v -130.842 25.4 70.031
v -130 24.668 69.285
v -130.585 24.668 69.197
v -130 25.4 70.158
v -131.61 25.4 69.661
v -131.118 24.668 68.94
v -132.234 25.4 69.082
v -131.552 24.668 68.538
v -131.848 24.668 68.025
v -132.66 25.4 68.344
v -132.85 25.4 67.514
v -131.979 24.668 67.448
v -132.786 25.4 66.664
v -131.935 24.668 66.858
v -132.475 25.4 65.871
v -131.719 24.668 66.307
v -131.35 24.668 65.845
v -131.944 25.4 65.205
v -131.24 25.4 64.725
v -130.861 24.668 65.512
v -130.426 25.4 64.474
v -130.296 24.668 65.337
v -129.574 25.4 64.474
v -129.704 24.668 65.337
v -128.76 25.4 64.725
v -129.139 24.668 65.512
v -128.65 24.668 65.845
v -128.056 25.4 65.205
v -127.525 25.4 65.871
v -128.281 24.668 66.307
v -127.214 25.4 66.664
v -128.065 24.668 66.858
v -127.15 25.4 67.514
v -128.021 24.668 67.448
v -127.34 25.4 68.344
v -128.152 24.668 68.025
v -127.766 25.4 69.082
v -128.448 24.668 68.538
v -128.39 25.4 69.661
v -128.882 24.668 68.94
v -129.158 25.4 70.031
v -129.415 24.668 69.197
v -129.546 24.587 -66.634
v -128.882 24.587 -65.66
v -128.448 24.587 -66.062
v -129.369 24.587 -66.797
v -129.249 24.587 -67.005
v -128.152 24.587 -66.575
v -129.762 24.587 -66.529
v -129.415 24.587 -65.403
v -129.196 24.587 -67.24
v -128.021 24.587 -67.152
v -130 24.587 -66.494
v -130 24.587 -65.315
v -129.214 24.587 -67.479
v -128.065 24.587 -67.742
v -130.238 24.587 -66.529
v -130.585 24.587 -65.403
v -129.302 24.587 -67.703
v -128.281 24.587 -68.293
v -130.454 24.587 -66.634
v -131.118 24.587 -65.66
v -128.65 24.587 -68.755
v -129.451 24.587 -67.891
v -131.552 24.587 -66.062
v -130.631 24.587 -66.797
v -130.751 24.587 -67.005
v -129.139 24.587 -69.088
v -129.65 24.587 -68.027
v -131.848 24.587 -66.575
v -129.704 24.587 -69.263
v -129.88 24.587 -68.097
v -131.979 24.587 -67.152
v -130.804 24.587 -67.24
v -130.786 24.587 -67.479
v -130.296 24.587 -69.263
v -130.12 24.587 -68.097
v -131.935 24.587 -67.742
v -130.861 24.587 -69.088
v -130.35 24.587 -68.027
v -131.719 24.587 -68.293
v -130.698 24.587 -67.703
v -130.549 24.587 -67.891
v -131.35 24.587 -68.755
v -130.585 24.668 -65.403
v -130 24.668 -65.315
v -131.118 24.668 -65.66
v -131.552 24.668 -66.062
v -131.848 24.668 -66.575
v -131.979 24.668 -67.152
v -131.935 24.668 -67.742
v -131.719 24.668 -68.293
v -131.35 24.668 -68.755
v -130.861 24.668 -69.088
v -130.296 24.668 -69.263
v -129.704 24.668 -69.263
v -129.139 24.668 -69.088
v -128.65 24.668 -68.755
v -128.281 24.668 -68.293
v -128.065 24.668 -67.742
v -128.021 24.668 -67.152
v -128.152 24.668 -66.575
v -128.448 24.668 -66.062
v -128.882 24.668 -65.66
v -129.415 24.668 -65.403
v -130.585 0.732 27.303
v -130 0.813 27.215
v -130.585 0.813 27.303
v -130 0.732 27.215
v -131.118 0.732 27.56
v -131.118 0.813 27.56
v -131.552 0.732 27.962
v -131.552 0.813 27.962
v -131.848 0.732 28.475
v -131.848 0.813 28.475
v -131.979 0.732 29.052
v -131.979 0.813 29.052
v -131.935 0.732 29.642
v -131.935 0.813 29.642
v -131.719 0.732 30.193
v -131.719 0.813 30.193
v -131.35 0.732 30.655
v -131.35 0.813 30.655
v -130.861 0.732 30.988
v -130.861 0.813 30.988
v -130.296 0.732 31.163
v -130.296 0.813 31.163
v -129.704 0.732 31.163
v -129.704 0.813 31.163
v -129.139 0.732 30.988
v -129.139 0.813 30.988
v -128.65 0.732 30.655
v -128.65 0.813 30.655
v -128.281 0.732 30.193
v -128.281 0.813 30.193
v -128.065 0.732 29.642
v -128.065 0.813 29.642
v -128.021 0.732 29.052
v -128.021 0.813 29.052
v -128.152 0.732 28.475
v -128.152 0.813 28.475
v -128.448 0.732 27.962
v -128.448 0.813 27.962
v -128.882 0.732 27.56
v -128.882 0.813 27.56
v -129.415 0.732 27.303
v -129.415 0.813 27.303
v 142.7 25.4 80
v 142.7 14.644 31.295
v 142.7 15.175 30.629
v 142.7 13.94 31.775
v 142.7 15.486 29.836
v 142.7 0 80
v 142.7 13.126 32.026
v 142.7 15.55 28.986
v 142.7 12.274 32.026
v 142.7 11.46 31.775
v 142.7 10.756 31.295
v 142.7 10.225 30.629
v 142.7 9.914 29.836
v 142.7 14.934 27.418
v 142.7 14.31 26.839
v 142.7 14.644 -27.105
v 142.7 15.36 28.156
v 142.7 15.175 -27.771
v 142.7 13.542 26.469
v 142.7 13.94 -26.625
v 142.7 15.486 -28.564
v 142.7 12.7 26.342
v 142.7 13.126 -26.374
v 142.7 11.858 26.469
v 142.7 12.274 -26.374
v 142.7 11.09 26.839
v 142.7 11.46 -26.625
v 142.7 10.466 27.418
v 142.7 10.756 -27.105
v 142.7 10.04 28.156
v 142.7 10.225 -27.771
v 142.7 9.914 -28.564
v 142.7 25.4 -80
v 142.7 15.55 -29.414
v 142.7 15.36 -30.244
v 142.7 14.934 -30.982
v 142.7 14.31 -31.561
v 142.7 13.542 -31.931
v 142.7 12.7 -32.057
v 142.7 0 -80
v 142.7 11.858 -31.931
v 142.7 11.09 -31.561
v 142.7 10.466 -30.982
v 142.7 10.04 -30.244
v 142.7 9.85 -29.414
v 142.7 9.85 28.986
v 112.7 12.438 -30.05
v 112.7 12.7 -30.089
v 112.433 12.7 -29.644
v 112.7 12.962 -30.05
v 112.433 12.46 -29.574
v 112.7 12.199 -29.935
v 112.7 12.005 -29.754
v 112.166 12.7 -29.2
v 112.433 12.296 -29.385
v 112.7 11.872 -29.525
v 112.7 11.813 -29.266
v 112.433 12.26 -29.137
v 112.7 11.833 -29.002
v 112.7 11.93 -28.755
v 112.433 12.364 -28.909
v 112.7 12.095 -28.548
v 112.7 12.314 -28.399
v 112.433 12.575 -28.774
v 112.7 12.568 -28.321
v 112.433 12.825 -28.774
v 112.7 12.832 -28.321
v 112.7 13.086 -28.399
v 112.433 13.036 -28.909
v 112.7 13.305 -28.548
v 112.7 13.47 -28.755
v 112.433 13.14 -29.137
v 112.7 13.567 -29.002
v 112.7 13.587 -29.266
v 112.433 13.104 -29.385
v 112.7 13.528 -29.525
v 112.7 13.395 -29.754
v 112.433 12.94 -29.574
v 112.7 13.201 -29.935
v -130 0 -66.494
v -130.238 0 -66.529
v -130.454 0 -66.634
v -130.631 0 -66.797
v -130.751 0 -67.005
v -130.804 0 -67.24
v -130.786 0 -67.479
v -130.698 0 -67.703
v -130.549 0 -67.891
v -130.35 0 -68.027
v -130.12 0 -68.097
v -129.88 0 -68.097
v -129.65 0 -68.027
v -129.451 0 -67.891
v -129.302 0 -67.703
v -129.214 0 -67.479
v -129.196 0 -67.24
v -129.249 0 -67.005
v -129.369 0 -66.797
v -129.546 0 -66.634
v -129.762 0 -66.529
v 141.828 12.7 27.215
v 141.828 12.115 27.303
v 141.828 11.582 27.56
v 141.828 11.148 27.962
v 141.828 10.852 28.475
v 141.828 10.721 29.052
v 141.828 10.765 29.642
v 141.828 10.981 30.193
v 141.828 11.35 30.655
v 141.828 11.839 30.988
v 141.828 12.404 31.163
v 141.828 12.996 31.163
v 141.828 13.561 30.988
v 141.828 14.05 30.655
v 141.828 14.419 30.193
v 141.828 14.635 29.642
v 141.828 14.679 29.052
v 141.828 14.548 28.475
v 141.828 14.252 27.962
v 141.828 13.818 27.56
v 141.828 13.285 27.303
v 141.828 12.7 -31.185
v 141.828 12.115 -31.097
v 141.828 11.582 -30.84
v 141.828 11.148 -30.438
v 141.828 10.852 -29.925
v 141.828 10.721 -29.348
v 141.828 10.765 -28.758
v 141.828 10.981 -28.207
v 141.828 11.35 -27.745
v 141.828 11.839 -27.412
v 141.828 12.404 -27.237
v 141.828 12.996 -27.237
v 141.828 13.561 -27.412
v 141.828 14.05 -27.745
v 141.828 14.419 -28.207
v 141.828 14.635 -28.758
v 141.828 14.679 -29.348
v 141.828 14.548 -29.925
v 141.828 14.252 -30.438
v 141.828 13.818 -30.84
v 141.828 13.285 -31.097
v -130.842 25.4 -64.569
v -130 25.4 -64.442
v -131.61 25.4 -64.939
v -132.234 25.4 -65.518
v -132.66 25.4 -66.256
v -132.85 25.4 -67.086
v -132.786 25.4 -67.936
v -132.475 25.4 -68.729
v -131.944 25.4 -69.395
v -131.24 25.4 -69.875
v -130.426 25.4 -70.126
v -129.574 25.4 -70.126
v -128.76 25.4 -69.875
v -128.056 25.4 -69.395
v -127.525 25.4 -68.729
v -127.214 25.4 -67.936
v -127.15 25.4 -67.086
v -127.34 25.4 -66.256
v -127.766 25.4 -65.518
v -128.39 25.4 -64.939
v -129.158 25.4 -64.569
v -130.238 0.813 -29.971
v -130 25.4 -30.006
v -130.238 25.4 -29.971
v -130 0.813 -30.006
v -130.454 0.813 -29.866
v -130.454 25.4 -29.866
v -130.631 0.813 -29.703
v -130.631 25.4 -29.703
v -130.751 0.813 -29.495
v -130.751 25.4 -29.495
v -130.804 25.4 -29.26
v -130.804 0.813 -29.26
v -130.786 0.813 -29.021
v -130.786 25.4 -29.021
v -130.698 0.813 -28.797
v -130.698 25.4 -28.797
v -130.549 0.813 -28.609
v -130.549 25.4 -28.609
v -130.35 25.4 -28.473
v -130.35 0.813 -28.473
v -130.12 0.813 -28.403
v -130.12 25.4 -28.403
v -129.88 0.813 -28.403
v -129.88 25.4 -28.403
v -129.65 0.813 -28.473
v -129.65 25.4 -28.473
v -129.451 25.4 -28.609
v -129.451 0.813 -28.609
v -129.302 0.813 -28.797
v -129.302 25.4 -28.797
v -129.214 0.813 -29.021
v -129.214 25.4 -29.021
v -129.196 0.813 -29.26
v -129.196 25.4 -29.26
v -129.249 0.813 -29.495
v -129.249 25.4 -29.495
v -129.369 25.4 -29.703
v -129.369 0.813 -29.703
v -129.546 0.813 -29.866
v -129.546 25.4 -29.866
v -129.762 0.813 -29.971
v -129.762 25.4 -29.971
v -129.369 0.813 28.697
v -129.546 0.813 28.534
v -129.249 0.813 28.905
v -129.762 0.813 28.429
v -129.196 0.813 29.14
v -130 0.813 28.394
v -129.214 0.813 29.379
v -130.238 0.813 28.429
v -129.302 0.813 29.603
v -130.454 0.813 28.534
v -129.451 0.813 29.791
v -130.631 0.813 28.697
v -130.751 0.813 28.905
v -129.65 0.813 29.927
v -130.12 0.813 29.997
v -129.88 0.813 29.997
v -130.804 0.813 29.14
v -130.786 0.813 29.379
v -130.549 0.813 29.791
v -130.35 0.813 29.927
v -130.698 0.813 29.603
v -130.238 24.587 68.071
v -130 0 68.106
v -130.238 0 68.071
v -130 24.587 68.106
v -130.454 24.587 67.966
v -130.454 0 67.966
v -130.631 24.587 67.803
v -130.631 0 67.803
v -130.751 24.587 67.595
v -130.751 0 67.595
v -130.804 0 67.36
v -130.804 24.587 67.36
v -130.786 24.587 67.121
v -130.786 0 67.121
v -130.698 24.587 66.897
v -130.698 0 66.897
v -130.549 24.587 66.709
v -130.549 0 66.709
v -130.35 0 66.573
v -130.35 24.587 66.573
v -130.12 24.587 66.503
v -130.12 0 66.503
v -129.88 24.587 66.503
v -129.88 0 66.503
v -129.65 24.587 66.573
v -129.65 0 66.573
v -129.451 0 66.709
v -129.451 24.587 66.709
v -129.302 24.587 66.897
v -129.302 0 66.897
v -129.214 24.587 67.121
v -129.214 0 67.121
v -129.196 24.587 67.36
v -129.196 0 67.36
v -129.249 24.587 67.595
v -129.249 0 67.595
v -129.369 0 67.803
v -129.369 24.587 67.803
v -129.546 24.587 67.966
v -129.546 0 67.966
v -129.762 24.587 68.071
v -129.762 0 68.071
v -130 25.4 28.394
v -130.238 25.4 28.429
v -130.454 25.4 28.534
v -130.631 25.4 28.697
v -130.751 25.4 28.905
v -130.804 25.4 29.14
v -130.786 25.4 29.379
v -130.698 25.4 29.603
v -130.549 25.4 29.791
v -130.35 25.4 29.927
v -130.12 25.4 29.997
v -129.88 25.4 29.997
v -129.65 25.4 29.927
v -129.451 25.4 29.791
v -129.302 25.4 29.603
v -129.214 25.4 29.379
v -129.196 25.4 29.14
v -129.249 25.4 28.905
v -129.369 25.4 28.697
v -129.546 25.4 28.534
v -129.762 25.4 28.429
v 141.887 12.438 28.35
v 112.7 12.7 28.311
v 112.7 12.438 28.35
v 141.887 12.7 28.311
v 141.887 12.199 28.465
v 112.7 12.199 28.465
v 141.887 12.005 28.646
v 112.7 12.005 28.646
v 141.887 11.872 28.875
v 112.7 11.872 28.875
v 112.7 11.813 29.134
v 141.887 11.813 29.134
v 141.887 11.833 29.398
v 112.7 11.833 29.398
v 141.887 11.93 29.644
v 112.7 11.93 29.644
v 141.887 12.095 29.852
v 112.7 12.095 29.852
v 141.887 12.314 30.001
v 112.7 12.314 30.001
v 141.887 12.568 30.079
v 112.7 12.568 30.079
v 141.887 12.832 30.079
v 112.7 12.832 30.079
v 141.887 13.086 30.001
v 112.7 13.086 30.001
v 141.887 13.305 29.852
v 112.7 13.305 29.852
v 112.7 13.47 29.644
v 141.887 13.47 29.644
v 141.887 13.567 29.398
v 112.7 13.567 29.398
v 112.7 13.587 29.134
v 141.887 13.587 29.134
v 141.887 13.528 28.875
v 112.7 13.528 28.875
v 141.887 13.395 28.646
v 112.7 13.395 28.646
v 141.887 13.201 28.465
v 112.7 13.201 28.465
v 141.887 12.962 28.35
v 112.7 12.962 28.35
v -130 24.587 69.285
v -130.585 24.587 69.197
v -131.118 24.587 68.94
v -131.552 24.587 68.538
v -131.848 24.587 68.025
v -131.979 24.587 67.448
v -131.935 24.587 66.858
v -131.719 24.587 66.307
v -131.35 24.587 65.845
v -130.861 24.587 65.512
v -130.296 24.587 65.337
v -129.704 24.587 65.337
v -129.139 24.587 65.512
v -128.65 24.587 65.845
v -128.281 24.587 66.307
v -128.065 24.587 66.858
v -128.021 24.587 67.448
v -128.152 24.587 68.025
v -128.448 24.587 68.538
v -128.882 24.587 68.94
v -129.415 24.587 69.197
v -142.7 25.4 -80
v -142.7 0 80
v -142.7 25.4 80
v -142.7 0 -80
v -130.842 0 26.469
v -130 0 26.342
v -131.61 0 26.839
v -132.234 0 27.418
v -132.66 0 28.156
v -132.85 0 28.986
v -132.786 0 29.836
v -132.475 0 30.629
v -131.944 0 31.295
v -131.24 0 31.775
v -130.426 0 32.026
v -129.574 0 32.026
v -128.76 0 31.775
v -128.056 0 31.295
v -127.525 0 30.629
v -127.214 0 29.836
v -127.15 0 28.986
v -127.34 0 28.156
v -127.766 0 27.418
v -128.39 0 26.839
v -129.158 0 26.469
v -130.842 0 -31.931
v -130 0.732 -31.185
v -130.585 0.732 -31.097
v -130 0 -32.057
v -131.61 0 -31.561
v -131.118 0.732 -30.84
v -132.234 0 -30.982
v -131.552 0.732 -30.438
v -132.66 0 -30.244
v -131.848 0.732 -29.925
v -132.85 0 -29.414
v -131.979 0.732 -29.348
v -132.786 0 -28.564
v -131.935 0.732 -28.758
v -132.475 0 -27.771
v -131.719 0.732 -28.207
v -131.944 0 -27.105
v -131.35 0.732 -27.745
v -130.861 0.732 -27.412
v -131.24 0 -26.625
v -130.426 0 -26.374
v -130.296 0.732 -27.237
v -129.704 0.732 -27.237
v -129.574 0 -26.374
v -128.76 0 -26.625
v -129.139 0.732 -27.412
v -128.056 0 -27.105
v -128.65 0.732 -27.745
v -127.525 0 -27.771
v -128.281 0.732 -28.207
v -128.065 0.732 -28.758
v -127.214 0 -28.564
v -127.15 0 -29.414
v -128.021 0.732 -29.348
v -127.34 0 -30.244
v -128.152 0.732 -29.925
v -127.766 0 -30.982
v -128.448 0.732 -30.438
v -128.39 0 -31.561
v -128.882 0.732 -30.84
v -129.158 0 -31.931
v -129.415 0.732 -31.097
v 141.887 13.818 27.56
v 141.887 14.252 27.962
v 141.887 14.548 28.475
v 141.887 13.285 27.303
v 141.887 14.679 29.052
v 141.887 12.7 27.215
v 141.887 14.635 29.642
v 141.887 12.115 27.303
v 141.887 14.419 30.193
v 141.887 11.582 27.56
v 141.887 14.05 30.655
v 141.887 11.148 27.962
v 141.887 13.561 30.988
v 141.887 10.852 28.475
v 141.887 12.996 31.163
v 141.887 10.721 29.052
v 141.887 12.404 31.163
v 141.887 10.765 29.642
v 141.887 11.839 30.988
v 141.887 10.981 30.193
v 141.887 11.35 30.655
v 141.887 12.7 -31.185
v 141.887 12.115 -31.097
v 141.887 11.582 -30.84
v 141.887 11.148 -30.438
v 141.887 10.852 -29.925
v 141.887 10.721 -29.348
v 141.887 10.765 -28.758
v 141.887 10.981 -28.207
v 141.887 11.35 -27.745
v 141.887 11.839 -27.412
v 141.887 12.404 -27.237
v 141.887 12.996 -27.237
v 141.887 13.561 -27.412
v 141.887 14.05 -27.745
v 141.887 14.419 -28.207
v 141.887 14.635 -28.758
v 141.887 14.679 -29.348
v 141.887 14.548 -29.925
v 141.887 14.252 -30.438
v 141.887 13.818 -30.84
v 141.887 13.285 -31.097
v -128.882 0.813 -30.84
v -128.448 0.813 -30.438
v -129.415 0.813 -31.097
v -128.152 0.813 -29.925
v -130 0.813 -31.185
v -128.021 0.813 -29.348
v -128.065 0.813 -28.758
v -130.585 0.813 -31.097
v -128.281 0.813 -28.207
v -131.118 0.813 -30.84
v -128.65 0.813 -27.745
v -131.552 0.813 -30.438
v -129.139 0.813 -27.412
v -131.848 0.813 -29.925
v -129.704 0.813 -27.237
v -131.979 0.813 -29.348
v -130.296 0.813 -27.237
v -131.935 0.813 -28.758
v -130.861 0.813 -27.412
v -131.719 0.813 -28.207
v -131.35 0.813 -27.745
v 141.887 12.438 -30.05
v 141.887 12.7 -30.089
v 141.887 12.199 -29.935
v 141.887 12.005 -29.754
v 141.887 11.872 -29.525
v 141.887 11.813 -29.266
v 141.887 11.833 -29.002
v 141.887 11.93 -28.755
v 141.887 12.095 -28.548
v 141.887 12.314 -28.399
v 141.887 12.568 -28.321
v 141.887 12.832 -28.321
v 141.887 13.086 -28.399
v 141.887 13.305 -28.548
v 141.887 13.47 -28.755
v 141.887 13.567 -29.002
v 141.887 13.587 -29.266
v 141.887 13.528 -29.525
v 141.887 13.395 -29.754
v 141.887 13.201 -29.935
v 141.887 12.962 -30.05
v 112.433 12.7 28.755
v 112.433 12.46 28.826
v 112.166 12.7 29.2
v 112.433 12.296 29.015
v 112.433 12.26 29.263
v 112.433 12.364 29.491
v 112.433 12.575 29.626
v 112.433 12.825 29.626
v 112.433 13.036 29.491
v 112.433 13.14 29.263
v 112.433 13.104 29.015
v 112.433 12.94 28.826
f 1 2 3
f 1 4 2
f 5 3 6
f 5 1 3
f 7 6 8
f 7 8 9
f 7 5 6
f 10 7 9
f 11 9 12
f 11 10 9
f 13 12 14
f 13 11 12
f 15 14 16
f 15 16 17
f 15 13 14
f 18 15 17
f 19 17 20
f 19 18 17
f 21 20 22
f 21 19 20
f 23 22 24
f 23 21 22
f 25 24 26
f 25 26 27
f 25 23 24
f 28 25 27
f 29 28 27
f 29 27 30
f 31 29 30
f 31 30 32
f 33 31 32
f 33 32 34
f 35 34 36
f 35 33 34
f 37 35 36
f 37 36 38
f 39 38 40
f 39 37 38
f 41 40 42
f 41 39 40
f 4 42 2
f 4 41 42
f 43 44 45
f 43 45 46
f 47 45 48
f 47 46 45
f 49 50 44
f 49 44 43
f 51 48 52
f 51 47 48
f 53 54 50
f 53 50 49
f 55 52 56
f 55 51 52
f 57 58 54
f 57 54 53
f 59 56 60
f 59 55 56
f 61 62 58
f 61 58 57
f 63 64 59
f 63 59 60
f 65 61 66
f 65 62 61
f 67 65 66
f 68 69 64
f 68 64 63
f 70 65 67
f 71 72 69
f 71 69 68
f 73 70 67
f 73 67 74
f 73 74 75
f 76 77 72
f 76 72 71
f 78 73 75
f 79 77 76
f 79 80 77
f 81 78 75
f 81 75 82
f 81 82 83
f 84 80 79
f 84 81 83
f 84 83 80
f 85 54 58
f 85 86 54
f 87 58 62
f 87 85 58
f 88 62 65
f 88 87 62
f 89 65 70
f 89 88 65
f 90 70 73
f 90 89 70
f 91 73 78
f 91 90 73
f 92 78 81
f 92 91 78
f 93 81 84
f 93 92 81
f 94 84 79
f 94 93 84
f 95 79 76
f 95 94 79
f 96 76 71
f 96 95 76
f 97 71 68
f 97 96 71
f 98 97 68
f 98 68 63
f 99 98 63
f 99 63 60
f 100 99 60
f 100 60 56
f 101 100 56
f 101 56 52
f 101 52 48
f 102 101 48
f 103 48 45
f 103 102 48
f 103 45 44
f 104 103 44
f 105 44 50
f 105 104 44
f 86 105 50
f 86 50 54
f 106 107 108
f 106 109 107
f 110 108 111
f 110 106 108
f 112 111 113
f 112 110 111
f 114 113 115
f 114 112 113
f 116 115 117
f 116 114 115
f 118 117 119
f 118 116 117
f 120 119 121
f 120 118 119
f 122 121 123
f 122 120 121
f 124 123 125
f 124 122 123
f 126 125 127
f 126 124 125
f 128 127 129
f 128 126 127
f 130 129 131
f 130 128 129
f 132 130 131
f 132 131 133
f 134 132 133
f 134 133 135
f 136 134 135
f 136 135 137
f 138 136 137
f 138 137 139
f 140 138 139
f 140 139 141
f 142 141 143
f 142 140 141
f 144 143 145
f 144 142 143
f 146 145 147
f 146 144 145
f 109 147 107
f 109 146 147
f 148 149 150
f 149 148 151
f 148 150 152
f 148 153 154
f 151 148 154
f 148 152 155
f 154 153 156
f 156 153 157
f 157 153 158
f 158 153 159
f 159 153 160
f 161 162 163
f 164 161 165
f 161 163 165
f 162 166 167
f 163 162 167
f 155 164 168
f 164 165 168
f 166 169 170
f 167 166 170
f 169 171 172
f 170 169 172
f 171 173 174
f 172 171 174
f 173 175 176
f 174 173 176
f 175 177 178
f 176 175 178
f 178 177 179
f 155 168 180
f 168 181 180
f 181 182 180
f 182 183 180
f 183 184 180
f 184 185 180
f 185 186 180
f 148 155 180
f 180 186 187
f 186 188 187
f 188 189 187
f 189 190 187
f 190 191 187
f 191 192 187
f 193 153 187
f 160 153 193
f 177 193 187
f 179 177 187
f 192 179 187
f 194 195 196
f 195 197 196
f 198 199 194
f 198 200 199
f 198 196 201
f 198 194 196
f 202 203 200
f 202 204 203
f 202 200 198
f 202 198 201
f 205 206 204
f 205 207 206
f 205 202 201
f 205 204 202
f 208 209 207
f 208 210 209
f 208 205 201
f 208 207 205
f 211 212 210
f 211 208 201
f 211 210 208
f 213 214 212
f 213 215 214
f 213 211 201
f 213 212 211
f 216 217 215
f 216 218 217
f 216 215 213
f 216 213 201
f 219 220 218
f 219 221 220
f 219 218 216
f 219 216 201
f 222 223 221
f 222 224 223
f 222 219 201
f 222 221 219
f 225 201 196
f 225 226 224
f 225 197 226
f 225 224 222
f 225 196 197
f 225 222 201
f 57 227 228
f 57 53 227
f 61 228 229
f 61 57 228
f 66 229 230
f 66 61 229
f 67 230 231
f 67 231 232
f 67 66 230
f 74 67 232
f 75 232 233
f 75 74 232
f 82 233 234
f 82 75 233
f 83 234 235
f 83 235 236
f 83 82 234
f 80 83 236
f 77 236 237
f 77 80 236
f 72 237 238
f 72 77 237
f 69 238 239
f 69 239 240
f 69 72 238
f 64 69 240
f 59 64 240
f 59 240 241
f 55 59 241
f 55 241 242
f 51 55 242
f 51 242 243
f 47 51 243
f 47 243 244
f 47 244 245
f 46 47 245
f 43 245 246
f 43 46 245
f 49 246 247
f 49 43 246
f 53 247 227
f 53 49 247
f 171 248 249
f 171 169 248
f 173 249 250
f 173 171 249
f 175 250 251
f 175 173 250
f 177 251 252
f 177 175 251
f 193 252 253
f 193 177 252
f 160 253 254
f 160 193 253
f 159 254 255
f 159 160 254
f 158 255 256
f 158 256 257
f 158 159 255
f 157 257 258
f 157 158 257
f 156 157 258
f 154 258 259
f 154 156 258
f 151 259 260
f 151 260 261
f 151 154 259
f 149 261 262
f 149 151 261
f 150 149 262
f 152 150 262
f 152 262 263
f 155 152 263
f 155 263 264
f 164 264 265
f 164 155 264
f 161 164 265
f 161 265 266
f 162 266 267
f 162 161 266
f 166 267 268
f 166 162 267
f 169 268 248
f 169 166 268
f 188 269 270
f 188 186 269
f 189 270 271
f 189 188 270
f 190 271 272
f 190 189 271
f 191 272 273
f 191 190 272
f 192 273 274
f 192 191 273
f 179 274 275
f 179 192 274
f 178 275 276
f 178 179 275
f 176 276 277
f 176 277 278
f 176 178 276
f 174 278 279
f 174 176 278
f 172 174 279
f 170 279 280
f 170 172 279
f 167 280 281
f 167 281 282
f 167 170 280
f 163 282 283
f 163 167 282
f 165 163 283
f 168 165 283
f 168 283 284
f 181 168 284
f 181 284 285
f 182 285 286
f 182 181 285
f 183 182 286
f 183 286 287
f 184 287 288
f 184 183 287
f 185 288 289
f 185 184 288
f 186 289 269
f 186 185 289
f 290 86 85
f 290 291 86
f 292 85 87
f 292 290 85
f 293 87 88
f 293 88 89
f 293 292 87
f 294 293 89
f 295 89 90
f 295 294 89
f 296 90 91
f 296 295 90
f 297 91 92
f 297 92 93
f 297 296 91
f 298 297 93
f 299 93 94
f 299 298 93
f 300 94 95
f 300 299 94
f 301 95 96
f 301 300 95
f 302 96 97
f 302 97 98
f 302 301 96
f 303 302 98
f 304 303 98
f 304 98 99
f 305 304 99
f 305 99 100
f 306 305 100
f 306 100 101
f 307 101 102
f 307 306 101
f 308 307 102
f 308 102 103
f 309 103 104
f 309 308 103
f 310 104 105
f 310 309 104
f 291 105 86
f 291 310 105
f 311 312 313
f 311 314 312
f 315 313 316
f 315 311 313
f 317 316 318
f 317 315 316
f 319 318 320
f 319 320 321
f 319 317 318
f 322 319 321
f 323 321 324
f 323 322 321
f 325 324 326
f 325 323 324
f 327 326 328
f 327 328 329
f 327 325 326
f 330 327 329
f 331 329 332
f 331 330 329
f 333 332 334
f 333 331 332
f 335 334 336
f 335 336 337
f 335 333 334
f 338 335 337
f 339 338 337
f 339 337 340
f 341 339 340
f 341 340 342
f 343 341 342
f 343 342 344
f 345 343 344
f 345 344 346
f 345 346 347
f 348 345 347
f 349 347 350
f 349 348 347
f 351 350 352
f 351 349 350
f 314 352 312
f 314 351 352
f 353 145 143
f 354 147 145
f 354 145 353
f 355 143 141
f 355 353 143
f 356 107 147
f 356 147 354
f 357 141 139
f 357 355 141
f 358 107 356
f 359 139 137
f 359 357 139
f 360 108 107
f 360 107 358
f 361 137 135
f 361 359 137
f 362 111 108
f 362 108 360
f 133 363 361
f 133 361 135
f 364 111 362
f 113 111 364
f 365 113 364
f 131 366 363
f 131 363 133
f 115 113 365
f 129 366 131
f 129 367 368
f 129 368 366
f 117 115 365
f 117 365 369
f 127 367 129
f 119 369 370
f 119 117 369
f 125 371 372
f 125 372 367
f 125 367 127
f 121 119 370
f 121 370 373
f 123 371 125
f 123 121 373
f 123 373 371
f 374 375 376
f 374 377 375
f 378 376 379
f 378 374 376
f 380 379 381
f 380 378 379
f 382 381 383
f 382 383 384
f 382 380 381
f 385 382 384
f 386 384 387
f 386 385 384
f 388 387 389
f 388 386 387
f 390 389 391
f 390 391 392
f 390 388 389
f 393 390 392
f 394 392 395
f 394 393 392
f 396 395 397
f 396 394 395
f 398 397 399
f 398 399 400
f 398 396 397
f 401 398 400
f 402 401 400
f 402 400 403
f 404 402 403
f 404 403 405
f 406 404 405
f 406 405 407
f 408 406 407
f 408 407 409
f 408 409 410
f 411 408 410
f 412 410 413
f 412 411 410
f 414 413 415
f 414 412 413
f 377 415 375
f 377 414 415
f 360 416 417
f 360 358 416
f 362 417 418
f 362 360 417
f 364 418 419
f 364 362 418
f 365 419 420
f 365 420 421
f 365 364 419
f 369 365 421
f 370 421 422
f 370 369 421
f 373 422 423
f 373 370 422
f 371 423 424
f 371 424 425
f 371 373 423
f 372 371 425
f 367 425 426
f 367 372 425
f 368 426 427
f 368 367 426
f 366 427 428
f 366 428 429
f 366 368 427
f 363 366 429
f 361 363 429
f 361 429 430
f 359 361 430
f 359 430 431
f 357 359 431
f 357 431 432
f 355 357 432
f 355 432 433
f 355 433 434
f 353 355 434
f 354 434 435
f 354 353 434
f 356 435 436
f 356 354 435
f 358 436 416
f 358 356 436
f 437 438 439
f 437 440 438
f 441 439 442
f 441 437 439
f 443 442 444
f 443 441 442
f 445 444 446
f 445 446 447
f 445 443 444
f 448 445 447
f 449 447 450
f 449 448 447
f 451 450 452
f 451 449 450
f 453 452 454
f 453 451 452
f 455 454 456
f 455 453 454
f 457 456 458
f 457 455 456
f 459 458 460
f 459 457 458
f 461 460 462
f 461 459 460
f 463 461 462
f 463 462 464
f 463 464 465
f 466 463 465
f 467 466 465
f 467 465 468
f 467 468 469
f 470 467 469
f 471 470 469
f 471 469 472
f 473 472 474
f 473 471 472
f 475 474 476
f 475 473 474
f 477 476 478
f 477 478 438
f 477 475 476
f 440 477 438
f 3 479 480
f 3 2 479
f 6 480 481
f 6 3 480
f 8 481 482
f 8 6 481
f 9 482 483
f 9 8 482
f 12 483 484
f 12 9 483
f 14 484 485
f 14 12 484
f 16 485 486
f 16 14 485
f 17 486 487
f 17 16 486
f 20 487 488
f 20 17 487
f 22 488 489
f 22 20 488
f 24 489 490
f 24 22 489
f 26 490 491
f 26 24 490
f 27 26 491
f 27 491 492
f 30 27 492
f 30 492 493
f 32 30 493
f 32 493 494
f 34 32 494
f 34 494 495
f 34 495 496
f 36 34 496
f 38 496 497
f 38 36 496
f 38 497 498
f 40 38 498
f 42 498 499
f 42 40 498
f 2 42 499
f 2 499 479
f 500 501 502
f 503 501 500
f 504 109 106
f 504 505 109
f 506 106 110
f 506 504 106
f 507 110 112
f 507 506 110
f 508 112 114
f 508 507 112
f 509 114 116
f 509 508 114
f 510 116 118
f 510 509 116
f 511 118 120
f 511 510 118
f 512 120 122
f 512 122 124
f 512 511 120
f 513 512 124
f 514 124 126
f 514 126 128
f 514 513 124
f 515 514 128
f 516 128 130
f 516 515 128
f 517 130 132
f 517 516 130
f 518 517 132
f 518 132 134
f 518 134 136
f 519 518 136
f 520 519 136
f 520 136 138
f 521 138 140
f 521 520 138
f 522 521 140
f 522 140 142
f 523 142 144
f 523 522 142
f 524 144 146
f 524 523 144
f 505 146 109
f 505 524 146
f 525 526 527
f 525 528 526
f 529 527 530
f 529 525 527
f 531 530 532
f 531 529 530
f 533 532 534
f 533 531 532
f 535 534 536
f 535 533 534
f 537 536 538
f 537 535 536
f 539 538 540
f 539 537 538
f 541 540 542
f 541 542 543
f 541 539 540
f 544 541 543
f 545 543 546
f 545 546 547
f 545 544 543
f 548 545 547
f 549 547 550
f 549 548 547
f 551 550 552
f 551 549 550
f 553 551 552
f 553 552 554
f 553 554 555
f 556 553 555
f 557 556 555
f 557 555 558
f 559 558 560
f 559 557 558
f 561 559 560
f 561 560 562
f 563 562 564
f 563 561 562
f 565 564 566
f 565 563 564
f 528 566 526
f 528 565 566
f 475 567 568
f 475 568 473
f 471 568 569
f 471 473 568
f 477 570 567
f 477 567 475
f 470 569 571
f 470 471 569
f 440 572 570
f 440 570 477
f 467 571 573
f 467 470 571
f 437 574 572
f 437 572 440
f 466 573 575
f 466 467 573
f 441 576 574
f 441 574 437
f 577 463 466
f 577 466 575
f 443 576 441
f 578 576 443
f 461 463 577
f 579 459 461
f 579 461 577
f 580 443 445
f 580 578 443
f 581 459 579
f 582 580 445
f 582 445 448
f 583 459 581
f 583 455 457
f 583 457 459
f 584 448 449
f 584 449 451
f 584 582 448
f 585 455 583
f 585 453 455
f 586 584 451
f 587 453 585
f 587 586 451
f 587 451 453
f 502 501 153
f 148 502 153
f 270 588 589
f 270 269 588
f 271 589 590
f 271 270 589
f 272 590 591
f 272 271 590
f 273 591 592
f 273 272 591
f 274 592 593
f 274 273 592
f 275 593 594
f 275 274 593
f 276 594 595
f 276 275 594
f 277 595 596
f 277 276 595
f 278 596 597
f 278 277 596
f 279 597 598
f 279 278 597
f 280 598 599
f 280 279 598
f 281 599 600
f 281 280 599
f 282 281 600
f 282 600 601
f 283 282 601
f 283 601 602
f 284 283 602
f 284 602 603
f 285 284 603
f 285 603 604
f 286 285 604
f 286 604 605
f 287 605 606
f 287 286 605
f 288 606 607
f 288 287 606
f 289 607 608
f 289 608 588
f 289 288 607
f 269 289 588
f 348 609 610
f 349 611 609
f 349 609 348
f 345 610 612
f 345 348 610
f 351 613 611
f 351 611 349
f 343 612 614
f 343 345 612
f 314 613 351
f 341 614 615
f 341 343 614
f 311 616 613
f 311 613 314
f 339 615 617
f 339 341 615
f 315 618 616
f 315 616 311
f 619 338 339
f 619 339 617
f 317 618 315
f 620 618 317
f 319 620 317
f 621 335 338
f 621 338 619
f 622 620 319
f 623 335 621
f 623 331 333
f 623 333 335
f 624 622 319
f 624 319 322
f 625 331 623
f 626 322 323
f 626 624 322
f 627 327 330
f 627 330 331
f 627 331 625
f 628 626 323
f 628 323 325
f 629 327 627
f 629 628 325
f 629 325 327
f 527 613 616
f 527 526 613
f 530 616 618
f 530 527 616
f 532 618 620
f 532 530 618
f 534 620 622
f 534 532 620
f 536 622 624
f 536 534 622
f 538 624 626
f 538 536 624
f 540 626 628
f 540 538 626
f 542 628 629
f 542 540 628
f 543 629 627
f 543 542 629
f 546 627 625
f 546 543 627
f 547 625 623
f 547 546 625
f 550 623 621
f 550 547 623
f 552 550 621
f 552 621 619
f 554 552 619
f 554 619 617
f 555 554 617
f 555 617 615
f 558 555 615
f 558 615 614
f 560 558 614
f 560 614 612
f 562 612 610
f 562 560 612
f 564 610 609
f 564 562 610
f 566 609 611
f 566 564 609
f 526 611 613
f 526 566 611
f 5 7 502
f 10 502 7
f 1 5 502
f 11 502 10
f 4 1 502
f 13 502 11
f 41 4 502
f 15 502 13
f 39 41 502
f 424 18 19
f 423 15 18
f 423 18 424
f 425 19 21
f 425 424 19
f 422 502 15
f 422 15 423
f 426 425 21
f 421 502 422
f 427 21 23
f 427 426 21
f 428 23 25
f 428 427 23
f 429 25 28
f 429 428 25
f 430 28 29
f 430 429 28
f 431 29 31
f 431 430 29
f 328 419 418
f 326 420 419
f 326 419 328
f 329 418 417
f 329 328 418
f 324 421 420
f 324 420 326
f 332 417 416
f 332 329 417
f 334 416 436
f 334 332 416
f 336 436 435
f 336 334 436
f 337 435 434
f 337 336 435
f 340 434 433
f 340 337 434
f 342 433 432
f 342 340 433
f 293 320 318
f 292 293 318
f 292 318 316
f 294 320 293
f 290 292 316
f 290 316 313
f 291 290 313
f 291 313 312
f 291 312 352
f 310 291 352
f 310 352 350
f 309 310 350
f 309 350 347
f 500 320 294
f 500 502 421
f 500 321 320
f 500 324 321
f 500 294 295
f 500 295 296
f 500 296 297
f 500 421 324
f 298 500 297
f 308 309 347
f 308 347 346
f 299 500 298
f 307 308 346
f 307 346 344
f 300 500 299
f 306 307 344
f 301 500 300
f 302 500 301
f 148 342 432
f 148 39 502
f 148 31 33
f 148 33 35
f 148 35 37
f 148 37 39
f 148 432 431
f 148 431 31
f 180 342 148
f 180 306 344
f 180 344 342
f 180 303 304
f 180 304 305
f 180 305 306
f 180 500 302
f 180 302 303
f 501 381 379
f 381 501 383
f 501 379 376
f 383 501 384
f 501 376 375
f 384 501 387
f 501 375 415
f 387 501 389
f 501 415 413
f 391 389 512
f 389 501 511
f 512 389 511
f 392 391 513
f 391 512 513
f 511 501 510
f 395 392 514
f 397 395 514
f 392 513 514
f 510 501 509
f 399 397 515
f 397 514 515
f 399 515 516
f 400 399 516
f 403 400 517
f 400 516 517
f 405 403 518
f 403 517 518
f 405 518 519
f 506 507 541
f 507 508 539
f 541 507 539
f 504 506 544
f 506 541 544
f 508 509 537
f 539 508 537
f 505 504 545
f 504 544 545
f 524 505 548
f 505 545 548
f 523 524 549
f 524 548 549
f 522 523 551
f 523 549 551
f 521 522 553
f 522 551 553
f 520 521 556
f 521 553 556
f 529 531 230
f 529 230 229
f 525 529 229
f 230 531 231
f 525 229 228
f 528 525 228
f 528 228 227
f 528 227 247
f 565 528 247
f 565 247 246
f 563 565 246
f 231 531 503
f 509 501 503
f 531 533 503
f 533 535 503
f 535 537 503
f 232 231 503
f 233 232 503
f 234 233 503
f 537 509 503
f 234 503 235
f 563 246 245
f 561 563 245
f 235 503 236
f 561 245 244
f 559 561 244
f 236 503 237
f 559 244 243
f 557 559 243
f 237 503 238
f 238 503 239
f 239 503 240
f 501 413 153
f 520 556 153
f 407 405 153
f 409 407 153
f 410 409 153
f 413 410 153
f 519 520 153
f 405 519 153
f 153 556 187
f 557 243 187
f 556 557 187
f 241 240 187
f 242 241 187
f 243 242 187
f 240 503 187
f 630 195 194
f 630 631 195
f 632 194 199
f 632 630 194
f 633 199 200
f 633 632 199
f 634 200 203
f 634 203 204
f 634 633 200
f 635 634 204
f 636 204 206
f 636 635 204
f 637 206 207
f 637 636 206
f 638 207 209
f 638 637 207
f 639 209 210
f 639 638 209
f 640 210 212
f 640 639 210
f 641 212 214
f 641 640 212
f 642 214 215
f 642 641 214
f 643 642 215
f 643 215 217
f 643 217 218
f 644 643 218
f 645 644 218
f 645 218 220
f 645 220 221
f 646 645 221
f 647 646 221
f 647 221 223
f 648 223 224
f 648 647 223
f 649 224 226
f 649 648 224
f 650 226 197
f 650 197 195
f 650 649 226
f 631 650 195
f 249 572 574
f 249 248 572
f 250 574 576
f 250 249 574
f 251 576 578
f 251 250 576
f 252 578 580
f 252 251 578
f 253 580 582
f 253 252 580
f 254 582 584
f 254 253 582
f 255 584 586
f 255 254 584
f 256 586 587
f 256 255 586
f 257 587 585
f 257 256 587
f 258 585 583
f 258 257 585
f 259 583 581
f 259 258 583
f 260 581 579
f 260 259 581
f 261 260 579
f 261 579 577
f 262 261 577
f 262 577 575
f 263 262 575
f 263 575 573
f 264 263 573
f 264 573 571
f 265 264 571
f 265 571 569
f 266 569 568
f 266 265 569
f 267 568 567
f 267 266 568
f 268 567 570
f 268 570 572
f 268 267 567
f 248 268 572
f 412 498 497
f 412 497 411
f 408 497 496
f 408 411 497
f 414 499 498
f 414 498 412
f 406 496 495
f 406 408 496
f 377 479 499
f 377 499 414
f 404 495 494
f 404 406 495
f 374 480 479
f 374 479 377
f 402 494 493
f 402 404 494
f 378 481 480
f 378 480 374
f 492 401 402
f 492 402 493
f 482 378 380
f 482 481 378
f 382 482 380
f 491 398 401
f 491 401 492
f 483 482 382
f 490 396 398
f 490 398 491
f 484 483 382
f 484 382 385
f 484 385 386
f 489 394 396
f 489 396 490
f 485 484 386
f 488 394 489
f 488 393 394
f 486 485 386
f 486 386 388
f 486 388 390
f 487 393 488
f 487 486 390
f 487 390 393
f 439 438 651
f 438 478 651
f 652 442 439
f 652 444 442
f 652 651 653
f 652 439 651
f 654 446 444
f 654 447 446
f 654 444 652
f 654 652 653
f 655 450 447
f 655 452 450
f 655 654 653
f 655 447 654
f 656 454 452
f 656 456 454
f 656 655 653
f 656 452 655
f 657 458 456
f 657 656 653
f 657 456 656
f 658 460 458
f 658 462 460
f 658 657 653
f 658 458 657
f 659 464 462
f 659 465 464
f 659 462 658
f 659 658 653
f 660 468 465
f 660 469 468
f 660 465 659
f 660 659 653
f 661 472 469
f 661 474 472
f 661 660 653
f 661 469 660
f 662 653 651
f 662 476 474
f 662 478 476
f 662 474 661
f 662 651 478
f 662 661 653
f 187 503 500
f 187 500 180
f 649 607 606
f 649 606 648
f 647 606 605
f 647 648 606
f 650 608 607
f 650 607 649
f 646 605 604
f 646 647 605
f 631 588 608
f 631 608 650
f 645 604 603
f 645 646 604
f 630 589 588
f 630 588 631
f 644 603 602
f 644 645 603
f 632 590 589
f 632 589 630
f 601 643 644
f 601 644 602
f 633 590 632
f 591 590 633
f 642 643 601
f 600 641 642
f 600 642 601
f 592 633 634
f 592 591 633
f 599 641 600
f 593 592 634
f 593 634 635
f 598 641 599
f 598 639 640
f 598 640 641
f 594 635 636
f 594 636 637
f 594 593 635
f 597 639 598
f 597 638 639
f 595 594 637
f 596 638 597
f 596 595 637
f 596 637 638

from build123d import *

# Parameters (mm, degrees)
SKETCH1_W                                   = 285.4
SKETCH1_H                                   = 160
BOSS_EXTRUDE1_DEPTH                         = 25.4
CBORE_FOR_0_BINDING_HEAD_MACHINE_SC_2_COUNT = 2
CBORE_FOR_0_BINDING_HEAD_MACHINE_SC_2_PITCH = 58.4
CBORE_FOR_0_BINDING_HEAD_MACHINE_SC_3_COUNT = 2
CBORE_FOR_0_BINDING_HEAD_MACHINE_SC_3_PITCH = 134.6
CBORE_FOR_0_BINDING_HEAD_MACHINE_SC_4_COUNT = 2
CBORE_FOR_0_BINDING_HEAD_MACHINE_SC_4_PITCH = 58.4


with BuildPart() as part:
    # Sketch1 → Boss-Extrude1 (new body)
    with BuildSketch(Plane(origin=(0, 0, 0), x_dir=(1, 0, 0), z_dir=(0, 1, 0))):
        Rectangle(SKETCH1_W, SKETCH1_H)
    extrude(amount=BOSS_EXTRUDE1_DEPTH)

    # Sketch3 → CBORE for #0 Binding Head Machine Screw3 (revolve, cut)
    with BuildSketch(Plane(origin=(142.7, 12.7, 29.2), x_dir=(0, 0, -1), z_dir=(0, 1, 0))):
        Polygon((0, 0), (0, 30.53416509), (0.889, 30), (0.889, 0.8128), (1.98501, 0.8128), (1.98501, 0.87249), (2.8575, 0), align=None)
    cbore_for_0_binding_head_machine_screw3 = revolve(axis=Axis((149.05, 12.7, 29.2), (-1, 0, 0)), mode=Mode.SUBTRACT)

    # CBORE for _0 Binding Head Machine Sc 2: CBORE for #0 Binding Head Machine Screw3 ×2
    with Locations(*[(0, 0, -i * CBORE_FOR_0_BINDING_HEAD_MACHINE_SC_2_PITCH) for i in range(1, CBORE_FOR_0_BINDING_HEAD_MACHINE_SC_2_COUNT)]):
        add(cbore_for_0_binding_head_machine_screw3, mode=Mode.SUBTRACT)

    # Sketch7 → CBORE for #0 Binding Head Machine Screw1 (revolve, cut)
    with BuildSketch(Plane(origin=(-130, 25.4, 67.3), x_dir=(0, 0, 1), z_dir=(1, 0, 0))):
        Polygon((0, 0), (0, 25.4), (0.80645, 25.4), (0.80645, 0.8128), (1.98501, 0.8128), (1.98501, 0.732106037), (2.8575, 0), align=None)
    cbore_for_0_binding_head_machine_screw1 = revolve(axis=Axis((-130, 31.75, 67.3), (0, -1, 0)), mode=Mode.SUBTRACT)

    # CBORE for _0 Binding Head Machine Sc 3: CBORE for #0 Binding Head Machine Screw1 ×2
    with Locations(*[(0, 0, -i * CBORE_FOR_0_BINDING_HEAD_MACHINE_SC_3_PITCH) for i in range(1, CBORE_FOR_0_BINDING_HEAD_MACHINE_SC_3_COUNT)]):
        add(cbore_for_0_binding_head_machine_screw1, mode=Mode.SUBTRACT)

    # Sketch9 → CBORE for #0 Binding Head Machine Screw2 (revolve, cut)
    with BuildSketch(Plane(origin=(-130, 0, -29.2), x_dir=(0, 0, -1), z_dir=(1, 0, 0))):
        Polygon((0, 0), (0, 25.4), (0.80645, 25.4), (0.80645, 0.8128), (1.98501, 0.8128), (1.98501, 0.732106037), (2.8575, 0), align=None)
    cbore_for_0_binding_head_machine_screw2 = revolve(axis=Axis((-130, -6.35, -29.2), (0, 1, 0)), mode=Mode.SUBTRACT)

    # CBORE for _0 Binding Head Machine Sc 4: CBORE for #0 Binding Head Machine Screw2 ×2
    with Locations(*[(0, 0, i * CBORE_FOR_0_BINDING_HEAD_MACHINE_SC_4_PITCH) for i in range(1, CBORE_FOR_0_BINDING_HEAD_MACHINE_SC_4_COUNT)]):
        add(cbore_for_0_binding_head_machine_screw2, mode=Mode.SUBTRACT)


solid = part.part
